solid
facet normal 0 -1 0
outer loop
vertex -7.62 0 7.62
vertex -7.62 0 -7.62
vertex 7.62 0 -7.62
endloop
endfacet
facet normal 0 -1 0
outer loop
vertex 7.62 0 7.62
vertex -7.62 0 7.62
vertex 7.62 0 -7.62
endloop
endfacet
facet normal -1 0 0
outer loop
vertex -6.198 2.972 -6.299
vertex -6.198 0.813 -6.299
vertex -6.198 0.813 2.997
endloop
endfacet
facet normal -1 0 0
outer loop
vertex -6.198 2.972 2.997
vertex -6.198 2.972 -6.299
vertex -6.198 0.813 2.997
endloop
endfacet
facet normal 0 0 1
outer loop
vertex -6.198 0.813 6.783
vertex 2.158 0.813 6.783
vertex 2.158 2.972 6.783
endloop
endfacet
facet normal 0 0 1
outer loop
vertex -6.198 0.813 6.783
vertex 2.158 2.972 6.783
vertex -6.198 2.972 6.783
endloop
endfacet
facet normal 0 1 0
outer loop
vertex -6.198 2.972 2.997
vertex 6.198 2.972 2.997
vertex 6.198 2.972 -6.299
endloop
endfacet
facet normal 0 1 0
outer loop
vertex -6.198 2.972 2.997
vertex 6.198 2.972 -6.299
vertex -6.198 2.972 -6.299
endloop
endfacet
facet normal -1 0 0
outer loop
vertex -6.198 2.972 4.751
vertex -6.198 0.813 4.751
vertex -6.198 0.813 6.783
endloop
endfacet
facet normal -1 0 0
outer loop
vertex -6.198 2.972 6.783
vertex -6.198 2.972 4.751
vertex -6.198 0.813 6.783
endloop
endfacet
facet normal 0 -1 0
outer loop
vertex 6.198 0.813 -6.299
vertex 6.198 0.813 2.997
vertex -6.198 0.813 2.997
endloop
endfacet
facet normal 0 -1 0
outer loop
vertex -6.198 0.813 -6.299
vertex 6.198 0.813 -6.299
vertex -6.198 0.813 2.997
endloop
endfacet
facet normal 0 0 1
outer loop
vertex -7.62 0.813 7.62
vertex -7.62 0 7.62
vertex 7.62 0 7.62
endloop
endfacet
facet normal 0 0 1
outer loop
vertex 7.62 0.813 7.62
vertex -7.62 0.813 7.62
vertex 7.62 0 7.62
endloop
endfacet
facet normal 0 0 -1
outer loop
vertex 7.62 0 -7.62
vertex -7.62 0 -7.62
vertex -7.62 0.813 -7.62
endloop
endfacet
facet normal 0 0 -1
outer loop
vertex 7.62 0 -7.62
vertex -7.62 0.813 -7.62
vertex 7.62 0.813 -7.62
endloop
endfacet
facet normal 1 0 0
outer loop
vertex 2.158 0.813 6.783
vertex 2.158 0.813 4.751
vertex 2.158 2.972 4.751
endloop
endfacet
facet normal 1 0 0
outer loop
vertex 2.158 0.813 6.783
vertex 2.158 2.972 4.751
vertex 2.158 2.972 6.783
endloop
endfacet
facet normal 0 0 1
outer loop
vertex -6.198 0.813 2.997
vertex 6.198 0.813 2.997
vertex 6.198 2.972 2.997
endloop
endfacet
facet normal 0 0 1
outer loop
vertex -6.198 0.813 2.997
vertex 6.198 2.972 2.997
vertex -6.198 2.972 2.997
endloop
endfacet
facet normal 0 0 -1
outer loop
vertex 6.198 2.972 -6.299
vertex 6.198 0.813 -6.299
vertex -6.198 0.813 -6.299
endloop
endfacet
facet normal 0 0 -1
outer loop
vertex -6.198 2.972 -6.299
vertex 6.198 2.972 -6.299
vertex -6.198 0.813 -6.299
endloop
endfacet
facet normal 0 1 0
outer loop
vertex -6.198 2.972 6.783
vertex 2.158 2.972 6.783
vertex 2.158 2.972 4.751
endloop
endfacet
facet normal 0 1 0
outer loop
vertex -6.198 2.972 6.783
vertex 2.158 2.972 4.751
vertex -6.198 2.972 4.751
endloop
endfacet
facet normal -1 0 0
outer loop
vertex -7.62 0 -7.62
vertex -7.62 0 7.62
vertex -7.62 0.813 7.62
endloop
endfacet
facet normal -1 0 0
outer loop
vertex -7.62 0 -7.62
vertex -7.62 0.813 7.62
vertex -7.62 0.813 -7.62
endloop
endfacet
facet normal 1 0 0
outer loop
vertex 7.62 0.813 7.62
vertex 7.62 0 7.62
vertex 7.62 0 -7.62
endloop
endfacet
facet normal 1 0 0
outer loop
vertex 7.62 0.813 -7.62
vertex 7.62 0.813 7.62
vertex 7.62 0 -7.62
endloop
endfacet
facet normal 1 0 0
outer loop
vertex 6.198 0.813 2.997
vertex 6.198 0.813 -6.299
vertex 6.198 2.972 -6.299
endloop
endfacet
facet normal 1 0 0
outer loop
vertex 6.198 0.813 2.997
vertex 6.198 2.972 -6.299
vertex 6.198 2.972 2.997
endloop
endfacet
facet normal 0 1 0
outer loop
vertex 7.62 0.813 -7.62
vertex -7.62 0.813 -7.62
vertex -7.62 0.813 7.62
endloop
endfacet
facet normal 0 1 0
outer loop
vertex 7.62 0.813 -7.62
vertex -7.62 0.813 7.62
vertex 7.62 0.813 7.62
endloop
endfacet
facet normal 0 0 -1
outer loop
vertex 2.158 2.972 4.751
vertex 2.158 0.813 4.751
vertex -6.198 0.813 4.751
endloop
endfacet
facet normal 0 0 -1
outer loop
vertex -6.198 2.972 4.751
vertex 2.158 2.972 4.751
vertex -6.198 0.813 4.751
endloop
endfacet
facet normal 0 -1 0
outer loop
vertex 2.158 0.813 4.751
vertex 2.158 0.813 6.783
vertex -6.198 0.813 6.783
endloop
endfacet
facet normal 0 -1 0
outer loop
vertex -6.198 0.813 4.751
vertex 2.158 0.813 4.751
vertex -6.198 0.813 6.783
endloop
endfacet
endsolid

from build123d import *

# Parameters (mm, degrees)
SKETCH1_W             = 15.24
SKETCH1_H             = 15.24
BOSS_EXTRUDE1_DEPTH   = 0.8128
SKETCH2_W             = 12.3952
SKETCH2_H             = 9.2964
BOSS_EXTRUDE2_DEPTH   = 2.159
SKETCH2_W_2           = 8.356011574
SKETCH2_H_2           = 2.032
BOSS_EXTRUDE2_2_DEPTH = 2.159


with BuildPart() as part:
    # Sketch1 → Boss-Extrude1 (new body)
    with BuildSketch(Plane(origin=(0, 0, 0), x_dir=(1, 0, 0), z_dir=(0, 1, 0))):
        Rectangle(SKETCH1_W, SKETCH1_H)
    extrude(amount=BOSS_EXTRUDE1_DEPTH)


with BuildPart() as body_2:
    # Sketch2 → Boss-Extrude2 (new body)
    with BuildSketch(Plane(origin=(0, 0.8128, 0), x_dir=(-1, 0, 0), z_dir=(0, 1, 0))):
        with Locations((0, -1.651)):
            Rectangle(SKETCH2_W, SKETCH2_H)
    extrude(amount=BOSS_EXTRUDE2_DEPTH)


with BuildPart() as body_3:
    # Sketch2 → Boss-Extrude2 2 (new body)
    with BuildSketch(Plane(origin=(0, 0.8128, 0), x_dir=(-1, 0, 0), z_dir=(0, 1, 0))):
        with Locations((2.019594213, 5.766936548)):
            Rectangle(SKETCH2_W_2, SKETCH2_H_2)
    extrude(amount=BOSS_EXTRUDE2_2_DEPTH)


solid = Compound([part.part, body_2.part, body_3.part])
